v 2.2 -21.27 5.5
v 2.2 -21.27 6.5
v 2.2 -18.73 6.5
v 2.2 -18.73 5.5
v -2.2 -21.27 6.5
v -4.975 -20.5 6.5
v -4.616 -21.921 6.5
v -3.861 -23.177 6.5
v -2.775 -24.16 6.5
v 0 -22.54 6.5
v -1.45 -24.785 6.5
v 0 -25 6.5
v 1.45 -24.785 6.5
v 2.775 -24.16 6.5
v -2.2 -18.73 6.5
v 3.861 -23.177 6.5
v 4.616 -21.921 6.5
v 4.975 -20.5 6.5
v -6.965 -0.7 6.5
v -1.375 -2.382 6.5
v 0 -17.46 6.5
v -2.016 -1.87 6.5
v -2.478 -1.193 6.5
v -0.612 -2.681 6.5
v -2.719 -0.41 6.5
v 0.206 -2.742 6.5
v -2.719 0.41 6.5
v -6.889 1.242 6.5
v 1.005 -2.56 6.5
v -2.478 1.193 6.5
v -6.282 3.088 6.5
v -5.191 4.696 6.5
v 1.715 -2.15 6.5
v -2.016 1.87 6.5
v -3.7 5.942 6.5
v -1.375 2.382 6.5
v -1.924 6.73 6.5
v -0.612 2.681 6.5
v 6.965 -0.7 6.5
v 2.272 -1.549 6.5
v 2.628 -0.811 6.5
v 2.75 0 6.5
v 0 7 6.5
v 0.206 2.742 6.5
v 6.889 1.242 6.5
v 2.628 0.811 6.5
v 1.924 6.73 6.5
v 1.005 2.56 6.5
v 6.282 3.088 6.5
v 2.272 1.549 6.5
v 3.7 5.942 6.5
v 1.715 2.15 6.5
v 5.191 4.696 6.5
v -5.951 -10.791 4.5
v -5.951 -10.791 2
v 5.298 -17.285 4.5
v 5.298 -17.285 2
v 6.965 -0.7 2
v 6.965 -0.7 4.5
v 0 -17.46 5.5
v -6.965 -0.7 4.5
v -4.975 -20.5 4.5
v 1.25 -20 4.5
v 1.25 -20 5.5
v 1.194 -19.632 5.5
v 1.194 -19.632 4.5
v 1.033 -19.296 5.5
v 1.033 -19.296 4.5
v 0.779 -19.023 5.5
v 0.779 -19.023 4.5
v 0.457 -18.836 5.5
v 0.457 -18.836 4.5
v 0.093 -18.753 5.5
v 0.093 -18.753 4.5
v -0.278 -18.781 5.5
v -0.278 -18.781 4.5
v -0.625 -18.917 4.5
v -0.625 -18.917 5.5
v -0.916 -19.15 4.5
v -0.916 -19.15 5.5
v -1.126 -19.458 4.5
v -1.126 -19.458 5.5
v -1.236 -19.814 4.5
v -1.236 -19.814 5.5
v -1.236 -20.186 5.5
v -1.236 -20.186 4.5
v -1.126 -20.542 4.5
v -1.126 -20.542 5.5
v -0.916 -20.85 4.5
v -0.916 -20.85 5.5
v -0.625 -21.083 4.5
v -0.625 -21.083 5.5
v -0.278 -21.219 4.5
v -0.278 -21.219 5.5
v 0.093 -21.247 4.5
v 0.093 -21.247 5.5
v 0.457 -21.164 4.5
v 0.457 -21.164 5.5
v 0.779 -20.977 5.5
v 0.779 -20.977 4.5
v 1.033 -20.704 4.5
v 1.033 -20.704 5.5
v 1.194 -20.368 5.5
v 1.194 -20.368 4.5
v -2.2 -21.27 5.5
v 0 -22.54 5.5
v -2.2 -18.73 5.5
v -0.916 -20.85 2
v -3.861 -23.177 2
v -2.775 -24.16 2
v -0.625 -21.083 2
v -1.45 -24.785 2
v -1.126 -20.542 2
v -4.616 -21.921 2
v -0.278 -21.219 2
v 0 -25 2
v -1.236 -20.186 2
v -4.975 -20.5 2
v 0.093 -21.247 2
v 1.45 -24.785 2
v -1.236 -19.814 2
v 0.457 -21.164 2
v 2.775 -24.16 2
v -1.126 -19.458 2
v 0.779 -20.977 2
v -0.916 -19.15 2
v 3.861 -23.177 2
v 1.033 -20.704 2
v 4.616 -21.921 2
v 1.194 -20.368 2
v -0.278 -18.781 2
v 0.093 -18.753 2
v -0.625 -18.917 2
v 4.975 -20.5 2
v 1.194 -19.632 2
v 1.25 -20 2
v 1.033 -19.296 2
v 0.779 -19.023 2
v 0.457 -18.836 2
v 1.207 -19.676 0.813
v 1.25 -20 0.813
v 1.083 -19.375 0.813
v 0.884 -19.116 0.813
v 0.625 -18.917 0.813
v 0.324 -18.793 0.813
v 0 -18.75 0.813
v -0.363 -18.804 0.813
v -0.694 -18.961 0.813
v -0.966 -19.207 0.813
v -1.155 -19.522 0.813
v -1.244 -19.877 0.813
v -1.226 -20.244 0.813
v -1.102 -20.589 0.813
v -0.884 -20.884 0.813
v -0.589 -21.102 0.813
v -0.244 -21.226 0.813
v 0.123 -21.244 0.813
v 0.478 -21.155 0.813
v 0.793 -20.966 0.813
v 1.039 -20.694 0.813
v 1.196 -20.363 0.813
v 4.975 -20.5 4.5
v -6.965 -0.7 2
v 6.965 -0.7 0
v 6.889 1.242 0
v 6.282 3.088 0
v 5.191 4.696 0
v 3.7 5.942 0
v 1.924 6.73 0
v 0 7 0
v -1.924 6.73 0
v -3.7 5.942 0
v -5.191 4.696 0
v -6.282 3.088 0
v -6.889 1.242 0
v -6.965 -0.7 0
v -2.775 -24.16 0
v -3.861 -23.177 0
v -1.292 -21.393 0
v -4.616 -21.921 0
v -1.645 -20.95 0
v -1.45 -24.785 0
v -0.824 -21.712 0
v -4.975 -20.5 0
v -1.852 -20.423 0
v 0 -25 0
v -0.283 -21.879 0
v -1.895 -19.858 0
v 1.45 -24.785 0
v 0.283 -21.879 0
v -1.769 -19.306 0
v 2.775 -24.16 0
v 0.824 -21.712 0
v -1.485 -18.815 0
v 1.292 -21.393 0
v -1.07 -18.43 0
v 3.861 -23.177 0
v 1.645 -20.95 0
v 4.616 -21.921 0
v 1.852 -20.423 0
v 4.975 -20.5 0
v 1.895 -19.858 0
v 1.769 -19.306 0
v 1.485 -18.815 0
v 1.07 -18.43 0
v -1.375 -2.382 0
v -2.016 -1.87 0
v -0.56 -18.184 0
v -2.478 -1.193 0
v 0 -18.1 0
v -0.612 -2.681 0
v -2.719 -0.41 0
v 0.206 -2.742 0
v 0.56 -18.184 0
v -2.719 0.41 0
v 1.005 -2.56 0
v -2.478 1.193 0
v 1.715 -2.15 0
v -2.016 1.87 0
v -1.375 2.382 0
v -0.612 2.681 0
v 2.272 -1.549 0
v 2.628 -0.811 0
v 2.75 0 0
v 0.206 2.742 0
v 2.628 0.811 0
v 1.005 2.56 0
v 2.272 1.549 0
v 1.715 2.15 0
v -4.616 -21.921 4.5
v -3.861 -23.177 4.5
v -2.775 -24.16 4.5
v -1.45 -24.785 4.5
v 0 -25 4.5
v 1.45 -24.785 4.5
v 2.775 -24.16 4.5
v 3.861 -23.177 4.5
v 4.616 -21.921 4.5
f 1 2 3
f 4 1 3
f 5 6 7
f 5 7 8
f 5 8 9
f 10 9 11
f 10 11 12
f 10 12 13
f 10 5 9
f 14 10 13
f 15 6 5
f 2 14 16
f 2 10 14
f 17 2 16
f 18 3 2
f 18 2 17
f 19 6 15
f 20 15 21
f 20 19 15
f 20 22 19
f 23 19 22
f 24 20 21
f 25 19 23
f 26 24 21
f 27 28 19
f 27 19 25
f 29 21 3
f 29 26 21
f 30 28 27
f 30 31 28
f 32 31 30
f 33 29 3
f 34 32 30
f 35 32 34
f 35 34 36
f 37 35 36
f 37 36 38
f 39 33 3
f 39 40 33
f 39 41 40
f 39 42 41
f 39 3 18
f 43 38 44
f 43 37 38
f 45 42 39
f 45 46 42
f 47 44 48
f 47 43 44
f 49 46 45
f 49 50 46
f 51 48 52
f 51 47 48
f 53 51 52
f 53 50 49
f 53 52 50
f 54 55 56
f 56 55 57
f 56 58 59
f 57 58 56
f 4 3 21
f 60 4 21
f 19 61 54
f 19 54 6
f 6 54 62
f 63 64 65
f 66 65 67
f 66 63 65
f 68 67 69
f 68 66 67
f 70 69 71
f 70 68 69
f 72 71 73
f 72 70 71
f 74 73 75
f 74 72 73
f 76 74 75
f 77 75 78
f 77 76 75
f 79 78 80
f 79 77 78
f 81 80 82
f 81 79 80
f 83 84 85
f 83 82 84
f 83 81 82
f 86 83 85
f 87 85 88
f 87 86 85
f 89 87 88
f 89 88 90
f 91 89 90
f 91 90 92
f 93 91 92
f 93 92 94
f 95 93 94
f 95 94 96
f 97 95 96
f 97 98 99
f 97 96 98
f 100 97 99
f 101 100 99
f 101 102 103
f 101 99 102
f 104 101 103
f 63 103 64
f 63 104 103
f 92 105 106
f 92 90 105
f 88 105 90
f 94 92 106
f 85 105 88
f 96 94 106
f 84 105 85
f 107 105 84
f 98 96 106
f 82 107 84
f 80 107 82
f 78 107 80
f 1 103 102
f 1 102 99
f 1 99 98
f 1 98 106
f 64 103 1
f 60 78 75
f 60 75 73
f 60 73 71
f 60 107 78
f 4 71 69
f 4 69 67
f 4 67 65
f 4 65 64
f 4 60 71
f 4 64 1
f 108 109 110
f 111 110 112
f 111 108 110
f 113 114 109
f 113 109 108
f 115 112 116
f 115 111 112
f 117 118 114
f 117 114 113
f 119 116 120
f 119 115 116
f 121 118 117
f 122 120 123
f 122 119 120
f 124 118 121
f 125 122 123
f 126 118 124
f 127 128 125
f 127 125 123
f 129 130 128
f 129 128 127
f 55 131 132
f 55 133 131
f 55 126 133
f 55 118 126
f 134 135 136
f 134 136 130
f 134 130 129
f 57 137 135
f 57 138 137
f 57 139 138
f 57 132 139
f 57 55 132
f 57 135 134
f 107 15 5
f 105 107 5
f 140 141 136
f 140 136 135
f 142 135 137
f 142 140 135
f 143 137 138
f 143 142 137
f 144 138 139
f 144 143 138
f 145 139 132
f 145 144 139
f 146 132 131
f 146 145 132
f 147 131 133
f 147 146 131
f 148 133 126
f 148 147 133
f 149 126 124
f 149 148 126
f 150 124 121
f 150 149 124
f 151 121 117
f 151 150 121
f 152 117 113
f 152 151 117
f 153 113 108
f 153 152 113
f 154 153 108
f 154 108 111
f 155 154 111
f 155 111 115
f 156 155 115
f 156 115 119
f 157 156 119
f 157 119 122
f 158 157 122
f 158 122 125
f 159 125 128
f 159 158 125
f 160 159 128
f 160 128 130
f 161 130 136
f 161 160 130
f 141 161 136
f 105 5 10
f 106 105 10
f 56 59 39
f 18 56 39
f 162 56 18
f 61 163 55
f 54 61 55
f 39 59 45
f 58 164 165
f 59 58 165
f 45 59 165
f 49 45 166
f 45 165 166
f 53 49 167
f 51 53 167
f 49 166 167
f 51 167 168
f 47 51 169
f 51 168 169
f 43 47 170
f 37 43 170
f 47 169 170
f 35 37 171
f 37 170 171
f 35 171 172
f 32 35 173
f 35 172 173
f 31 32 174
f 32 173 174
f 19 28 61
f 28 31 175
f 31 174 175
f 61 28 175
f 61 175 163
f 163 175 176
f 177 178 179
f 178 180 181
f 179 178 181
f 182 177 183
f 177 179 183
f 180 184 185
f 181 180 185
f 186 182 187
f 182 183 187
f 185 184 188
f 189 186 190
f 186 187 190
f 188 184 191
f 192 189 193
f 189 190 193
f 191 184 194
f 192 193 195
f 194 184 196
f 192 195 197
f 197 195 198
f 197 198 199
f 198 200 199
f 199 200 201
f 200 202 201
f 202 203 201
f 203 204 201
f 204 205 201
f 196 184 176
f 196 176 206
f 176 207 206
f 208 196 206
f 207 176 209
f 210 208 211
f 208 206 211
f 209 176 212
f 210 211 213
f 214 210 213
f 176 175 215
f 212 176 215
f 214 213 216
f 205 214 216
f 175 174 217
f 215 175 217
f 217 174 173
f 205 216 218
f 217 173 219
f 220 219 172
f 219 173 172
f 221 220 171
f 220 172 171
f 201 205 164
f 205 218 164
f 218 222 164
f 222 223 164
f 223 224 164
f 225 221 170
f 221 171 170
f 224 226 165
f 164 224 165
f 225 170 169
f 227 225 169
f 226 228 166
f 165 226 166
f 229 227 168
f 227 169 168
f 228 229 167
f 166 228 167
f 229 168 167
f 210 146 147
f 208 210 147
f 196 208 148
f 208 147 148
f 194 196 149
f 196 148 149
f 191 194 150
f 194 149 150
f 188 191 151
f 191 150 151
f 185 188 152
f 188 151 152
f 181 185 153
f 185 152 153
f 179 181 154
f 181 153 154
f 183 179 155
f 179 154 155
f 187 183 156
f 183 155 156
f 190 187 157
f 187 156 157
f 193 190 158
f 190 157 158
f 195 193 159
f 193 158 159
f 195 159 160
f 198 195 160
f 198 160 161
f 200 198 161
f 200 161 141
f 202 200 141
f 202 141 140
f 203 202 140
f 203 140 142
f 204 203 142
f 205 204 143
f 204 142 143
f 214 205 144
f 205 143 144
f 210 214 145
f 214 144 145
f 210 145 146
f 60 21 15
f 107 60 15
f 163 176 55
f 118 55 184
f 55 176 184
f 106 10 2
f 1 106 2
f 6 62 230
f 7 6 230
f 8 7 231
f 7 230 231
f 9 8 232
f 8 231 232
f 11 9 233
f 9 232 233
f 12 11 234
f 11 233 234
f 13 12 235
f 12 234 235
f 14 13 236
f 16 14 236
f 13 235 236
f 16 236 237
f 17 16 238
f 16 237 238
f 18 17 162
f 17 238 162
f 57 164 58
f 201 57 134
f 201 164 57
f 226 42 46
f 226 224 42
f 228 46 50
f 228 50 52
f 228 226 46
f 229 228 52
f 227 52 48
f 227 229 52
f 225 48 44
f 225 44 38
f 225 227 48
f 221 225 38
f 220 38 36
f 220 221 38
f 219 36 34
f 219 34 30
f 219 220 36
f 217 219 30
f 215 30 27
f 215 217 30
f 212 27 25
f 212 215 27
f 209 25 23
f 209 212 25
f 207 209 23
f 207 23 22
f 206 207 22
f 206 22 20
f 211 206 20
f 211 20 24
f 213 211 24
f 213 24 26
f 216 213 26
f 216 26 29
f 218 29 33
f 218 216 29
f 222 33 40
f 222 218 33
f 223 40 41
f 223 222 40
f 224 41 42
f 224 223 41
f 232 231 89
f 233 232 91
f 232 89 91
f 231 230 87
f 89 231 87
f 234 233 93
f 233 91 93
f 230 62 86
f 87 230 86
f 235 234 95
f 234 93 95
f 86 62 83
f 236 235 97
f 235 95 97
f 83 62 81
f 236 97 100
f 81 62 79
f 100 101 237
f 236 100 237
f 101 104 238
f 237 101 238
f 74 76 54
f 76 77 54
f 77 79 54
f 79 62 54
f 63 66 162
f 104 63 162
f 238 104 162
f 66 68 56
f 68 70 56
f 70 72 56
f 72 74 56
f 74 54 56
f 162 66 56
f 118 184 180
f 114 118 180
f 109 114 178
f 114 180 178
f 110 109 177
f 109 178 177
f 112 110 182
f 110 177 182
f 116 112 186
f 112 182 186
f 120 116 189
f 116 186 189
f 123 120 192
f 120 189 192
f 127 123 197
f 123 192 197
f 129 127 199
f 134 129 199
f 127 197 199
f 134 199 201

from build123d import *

# Parameters (mm, degrees)
SKETCH_R      = 2.75
SKETCH_R_2    = 1.25
PAD_DEPTH     = 2
SKETCH001_R   = 4.75
SKETCH001_R_2 = 2.75
PAD001_DEPTH  = 2
SKETCH002_R   = 2.75
PAD002_DEPTH  = 2.5
SKETCH003_R   = 2.75
SKETCH003_R_2 = 1.25
PAD003_DEPTH  = 2
POCKET_DEPTH  = 1


with BuildPart() as part:
    # Sketch → Pad (new body)
    with BuildSketch(Plane.XY):
        with BuildLine():
            ThreePointArc((6.964912, -0.7), (0, 7), (-6.964912, -0.7))
            Line((-6.964912, -0.7), (-4.974937, -20.5))
            ThreePointArc((-4.974937, -20.5), (0, -25), (4.974937, -20.5))
            Line((6.964912, -0.7), (4.974937, -20.5))
        make_face()
        Circle(SKETCH_R, mode=Mode.SUBTRACT)
        with Locations((0, -20)):
            Circle(SKETCH_R_2, mode=Mode.SUBTRACT)
    extrude(amount=PAD_DEPTH)

    # Sketch001 (on DatumPlane) → Pad001 (join)
    with BuildSketch(Plane.XY.offset(2)):
        Circle(SKETCH001_R)
        Circle(SKETCH001_R_2, mode=Mode.SUBTRACT)
    extrude(amount=PAD001_DEPTH)

    # Sketch002 (on DatumPlane) → Pad002 (join)
    with BuildSketch(Plane.XY.offset(2)):
        with BuildLine():
            Line((-5.950745, -10.790833), (5.298025, -17.285314))
            Line((6.964912, -0.7), (5.298025, -17.285314))
            ThreePointArc((6.964912, -0.7), (0, 7), (-6.964912, -0.7))
            Line((-6.964912, -0.7), (-5.950745, -10.790833))
        make_face()
        Circle(SKETCH002_R, mode=Mode.SUBTRACT)
    extrude(amount=PAD002_DEPTH)

    # Sketch003 (on DatumPlane) → Pad003 (join)
    with BuildSketch(Plane.XY.offset(4.5)):
        with BuildLine():
            ThreePointArc((6.964912, -0.7), (0, 7), (-6.964912, -0.7))
            Line((-6.964912, -0.7), (-4.974937, -20.5))
            ThreePointArc((-4.974937, -20.5), (0, -25), (4.974937, -20.5))
            Line((6.964912, -0.7), (4.974937, -20.5))
        make_face()
        Circle(SKETCH003_R, mode=Mode.SUBTRACT)
        with Locations((0, -20)):
            Circle(SKETCH003_R_2, mode=Mode.SUBTRACT)
    extrude(amount=PAD003_DEPTH)

    # Sketch007 (on DatumPlane) → Pocket (cut)
    with BuildSketch(Plane.XY.offset(6.5)):
        Polygon((2.2, -21.270171), (2.2, -18.729829), (0, -17.459659), (-2.2, -18.729829), (-2.2, -21.270171), (0, -22.540341), align=None)
    extrude(amount=-POCKET_DEPTH, mode=Mode.SUBTRACT)

    # Sketch008 → Groove (revolve, cut)
    with BuildSketch(Plane.YZ):
        Polygon((-20, 0), (-18.1, 0), (-18.9, 1), (-20, 1), align=None)
    revolve(axis=Axis((0, -20, 0), (0, 0, 1)), mode=Mode.SUBTRACT)


solid = part.part
